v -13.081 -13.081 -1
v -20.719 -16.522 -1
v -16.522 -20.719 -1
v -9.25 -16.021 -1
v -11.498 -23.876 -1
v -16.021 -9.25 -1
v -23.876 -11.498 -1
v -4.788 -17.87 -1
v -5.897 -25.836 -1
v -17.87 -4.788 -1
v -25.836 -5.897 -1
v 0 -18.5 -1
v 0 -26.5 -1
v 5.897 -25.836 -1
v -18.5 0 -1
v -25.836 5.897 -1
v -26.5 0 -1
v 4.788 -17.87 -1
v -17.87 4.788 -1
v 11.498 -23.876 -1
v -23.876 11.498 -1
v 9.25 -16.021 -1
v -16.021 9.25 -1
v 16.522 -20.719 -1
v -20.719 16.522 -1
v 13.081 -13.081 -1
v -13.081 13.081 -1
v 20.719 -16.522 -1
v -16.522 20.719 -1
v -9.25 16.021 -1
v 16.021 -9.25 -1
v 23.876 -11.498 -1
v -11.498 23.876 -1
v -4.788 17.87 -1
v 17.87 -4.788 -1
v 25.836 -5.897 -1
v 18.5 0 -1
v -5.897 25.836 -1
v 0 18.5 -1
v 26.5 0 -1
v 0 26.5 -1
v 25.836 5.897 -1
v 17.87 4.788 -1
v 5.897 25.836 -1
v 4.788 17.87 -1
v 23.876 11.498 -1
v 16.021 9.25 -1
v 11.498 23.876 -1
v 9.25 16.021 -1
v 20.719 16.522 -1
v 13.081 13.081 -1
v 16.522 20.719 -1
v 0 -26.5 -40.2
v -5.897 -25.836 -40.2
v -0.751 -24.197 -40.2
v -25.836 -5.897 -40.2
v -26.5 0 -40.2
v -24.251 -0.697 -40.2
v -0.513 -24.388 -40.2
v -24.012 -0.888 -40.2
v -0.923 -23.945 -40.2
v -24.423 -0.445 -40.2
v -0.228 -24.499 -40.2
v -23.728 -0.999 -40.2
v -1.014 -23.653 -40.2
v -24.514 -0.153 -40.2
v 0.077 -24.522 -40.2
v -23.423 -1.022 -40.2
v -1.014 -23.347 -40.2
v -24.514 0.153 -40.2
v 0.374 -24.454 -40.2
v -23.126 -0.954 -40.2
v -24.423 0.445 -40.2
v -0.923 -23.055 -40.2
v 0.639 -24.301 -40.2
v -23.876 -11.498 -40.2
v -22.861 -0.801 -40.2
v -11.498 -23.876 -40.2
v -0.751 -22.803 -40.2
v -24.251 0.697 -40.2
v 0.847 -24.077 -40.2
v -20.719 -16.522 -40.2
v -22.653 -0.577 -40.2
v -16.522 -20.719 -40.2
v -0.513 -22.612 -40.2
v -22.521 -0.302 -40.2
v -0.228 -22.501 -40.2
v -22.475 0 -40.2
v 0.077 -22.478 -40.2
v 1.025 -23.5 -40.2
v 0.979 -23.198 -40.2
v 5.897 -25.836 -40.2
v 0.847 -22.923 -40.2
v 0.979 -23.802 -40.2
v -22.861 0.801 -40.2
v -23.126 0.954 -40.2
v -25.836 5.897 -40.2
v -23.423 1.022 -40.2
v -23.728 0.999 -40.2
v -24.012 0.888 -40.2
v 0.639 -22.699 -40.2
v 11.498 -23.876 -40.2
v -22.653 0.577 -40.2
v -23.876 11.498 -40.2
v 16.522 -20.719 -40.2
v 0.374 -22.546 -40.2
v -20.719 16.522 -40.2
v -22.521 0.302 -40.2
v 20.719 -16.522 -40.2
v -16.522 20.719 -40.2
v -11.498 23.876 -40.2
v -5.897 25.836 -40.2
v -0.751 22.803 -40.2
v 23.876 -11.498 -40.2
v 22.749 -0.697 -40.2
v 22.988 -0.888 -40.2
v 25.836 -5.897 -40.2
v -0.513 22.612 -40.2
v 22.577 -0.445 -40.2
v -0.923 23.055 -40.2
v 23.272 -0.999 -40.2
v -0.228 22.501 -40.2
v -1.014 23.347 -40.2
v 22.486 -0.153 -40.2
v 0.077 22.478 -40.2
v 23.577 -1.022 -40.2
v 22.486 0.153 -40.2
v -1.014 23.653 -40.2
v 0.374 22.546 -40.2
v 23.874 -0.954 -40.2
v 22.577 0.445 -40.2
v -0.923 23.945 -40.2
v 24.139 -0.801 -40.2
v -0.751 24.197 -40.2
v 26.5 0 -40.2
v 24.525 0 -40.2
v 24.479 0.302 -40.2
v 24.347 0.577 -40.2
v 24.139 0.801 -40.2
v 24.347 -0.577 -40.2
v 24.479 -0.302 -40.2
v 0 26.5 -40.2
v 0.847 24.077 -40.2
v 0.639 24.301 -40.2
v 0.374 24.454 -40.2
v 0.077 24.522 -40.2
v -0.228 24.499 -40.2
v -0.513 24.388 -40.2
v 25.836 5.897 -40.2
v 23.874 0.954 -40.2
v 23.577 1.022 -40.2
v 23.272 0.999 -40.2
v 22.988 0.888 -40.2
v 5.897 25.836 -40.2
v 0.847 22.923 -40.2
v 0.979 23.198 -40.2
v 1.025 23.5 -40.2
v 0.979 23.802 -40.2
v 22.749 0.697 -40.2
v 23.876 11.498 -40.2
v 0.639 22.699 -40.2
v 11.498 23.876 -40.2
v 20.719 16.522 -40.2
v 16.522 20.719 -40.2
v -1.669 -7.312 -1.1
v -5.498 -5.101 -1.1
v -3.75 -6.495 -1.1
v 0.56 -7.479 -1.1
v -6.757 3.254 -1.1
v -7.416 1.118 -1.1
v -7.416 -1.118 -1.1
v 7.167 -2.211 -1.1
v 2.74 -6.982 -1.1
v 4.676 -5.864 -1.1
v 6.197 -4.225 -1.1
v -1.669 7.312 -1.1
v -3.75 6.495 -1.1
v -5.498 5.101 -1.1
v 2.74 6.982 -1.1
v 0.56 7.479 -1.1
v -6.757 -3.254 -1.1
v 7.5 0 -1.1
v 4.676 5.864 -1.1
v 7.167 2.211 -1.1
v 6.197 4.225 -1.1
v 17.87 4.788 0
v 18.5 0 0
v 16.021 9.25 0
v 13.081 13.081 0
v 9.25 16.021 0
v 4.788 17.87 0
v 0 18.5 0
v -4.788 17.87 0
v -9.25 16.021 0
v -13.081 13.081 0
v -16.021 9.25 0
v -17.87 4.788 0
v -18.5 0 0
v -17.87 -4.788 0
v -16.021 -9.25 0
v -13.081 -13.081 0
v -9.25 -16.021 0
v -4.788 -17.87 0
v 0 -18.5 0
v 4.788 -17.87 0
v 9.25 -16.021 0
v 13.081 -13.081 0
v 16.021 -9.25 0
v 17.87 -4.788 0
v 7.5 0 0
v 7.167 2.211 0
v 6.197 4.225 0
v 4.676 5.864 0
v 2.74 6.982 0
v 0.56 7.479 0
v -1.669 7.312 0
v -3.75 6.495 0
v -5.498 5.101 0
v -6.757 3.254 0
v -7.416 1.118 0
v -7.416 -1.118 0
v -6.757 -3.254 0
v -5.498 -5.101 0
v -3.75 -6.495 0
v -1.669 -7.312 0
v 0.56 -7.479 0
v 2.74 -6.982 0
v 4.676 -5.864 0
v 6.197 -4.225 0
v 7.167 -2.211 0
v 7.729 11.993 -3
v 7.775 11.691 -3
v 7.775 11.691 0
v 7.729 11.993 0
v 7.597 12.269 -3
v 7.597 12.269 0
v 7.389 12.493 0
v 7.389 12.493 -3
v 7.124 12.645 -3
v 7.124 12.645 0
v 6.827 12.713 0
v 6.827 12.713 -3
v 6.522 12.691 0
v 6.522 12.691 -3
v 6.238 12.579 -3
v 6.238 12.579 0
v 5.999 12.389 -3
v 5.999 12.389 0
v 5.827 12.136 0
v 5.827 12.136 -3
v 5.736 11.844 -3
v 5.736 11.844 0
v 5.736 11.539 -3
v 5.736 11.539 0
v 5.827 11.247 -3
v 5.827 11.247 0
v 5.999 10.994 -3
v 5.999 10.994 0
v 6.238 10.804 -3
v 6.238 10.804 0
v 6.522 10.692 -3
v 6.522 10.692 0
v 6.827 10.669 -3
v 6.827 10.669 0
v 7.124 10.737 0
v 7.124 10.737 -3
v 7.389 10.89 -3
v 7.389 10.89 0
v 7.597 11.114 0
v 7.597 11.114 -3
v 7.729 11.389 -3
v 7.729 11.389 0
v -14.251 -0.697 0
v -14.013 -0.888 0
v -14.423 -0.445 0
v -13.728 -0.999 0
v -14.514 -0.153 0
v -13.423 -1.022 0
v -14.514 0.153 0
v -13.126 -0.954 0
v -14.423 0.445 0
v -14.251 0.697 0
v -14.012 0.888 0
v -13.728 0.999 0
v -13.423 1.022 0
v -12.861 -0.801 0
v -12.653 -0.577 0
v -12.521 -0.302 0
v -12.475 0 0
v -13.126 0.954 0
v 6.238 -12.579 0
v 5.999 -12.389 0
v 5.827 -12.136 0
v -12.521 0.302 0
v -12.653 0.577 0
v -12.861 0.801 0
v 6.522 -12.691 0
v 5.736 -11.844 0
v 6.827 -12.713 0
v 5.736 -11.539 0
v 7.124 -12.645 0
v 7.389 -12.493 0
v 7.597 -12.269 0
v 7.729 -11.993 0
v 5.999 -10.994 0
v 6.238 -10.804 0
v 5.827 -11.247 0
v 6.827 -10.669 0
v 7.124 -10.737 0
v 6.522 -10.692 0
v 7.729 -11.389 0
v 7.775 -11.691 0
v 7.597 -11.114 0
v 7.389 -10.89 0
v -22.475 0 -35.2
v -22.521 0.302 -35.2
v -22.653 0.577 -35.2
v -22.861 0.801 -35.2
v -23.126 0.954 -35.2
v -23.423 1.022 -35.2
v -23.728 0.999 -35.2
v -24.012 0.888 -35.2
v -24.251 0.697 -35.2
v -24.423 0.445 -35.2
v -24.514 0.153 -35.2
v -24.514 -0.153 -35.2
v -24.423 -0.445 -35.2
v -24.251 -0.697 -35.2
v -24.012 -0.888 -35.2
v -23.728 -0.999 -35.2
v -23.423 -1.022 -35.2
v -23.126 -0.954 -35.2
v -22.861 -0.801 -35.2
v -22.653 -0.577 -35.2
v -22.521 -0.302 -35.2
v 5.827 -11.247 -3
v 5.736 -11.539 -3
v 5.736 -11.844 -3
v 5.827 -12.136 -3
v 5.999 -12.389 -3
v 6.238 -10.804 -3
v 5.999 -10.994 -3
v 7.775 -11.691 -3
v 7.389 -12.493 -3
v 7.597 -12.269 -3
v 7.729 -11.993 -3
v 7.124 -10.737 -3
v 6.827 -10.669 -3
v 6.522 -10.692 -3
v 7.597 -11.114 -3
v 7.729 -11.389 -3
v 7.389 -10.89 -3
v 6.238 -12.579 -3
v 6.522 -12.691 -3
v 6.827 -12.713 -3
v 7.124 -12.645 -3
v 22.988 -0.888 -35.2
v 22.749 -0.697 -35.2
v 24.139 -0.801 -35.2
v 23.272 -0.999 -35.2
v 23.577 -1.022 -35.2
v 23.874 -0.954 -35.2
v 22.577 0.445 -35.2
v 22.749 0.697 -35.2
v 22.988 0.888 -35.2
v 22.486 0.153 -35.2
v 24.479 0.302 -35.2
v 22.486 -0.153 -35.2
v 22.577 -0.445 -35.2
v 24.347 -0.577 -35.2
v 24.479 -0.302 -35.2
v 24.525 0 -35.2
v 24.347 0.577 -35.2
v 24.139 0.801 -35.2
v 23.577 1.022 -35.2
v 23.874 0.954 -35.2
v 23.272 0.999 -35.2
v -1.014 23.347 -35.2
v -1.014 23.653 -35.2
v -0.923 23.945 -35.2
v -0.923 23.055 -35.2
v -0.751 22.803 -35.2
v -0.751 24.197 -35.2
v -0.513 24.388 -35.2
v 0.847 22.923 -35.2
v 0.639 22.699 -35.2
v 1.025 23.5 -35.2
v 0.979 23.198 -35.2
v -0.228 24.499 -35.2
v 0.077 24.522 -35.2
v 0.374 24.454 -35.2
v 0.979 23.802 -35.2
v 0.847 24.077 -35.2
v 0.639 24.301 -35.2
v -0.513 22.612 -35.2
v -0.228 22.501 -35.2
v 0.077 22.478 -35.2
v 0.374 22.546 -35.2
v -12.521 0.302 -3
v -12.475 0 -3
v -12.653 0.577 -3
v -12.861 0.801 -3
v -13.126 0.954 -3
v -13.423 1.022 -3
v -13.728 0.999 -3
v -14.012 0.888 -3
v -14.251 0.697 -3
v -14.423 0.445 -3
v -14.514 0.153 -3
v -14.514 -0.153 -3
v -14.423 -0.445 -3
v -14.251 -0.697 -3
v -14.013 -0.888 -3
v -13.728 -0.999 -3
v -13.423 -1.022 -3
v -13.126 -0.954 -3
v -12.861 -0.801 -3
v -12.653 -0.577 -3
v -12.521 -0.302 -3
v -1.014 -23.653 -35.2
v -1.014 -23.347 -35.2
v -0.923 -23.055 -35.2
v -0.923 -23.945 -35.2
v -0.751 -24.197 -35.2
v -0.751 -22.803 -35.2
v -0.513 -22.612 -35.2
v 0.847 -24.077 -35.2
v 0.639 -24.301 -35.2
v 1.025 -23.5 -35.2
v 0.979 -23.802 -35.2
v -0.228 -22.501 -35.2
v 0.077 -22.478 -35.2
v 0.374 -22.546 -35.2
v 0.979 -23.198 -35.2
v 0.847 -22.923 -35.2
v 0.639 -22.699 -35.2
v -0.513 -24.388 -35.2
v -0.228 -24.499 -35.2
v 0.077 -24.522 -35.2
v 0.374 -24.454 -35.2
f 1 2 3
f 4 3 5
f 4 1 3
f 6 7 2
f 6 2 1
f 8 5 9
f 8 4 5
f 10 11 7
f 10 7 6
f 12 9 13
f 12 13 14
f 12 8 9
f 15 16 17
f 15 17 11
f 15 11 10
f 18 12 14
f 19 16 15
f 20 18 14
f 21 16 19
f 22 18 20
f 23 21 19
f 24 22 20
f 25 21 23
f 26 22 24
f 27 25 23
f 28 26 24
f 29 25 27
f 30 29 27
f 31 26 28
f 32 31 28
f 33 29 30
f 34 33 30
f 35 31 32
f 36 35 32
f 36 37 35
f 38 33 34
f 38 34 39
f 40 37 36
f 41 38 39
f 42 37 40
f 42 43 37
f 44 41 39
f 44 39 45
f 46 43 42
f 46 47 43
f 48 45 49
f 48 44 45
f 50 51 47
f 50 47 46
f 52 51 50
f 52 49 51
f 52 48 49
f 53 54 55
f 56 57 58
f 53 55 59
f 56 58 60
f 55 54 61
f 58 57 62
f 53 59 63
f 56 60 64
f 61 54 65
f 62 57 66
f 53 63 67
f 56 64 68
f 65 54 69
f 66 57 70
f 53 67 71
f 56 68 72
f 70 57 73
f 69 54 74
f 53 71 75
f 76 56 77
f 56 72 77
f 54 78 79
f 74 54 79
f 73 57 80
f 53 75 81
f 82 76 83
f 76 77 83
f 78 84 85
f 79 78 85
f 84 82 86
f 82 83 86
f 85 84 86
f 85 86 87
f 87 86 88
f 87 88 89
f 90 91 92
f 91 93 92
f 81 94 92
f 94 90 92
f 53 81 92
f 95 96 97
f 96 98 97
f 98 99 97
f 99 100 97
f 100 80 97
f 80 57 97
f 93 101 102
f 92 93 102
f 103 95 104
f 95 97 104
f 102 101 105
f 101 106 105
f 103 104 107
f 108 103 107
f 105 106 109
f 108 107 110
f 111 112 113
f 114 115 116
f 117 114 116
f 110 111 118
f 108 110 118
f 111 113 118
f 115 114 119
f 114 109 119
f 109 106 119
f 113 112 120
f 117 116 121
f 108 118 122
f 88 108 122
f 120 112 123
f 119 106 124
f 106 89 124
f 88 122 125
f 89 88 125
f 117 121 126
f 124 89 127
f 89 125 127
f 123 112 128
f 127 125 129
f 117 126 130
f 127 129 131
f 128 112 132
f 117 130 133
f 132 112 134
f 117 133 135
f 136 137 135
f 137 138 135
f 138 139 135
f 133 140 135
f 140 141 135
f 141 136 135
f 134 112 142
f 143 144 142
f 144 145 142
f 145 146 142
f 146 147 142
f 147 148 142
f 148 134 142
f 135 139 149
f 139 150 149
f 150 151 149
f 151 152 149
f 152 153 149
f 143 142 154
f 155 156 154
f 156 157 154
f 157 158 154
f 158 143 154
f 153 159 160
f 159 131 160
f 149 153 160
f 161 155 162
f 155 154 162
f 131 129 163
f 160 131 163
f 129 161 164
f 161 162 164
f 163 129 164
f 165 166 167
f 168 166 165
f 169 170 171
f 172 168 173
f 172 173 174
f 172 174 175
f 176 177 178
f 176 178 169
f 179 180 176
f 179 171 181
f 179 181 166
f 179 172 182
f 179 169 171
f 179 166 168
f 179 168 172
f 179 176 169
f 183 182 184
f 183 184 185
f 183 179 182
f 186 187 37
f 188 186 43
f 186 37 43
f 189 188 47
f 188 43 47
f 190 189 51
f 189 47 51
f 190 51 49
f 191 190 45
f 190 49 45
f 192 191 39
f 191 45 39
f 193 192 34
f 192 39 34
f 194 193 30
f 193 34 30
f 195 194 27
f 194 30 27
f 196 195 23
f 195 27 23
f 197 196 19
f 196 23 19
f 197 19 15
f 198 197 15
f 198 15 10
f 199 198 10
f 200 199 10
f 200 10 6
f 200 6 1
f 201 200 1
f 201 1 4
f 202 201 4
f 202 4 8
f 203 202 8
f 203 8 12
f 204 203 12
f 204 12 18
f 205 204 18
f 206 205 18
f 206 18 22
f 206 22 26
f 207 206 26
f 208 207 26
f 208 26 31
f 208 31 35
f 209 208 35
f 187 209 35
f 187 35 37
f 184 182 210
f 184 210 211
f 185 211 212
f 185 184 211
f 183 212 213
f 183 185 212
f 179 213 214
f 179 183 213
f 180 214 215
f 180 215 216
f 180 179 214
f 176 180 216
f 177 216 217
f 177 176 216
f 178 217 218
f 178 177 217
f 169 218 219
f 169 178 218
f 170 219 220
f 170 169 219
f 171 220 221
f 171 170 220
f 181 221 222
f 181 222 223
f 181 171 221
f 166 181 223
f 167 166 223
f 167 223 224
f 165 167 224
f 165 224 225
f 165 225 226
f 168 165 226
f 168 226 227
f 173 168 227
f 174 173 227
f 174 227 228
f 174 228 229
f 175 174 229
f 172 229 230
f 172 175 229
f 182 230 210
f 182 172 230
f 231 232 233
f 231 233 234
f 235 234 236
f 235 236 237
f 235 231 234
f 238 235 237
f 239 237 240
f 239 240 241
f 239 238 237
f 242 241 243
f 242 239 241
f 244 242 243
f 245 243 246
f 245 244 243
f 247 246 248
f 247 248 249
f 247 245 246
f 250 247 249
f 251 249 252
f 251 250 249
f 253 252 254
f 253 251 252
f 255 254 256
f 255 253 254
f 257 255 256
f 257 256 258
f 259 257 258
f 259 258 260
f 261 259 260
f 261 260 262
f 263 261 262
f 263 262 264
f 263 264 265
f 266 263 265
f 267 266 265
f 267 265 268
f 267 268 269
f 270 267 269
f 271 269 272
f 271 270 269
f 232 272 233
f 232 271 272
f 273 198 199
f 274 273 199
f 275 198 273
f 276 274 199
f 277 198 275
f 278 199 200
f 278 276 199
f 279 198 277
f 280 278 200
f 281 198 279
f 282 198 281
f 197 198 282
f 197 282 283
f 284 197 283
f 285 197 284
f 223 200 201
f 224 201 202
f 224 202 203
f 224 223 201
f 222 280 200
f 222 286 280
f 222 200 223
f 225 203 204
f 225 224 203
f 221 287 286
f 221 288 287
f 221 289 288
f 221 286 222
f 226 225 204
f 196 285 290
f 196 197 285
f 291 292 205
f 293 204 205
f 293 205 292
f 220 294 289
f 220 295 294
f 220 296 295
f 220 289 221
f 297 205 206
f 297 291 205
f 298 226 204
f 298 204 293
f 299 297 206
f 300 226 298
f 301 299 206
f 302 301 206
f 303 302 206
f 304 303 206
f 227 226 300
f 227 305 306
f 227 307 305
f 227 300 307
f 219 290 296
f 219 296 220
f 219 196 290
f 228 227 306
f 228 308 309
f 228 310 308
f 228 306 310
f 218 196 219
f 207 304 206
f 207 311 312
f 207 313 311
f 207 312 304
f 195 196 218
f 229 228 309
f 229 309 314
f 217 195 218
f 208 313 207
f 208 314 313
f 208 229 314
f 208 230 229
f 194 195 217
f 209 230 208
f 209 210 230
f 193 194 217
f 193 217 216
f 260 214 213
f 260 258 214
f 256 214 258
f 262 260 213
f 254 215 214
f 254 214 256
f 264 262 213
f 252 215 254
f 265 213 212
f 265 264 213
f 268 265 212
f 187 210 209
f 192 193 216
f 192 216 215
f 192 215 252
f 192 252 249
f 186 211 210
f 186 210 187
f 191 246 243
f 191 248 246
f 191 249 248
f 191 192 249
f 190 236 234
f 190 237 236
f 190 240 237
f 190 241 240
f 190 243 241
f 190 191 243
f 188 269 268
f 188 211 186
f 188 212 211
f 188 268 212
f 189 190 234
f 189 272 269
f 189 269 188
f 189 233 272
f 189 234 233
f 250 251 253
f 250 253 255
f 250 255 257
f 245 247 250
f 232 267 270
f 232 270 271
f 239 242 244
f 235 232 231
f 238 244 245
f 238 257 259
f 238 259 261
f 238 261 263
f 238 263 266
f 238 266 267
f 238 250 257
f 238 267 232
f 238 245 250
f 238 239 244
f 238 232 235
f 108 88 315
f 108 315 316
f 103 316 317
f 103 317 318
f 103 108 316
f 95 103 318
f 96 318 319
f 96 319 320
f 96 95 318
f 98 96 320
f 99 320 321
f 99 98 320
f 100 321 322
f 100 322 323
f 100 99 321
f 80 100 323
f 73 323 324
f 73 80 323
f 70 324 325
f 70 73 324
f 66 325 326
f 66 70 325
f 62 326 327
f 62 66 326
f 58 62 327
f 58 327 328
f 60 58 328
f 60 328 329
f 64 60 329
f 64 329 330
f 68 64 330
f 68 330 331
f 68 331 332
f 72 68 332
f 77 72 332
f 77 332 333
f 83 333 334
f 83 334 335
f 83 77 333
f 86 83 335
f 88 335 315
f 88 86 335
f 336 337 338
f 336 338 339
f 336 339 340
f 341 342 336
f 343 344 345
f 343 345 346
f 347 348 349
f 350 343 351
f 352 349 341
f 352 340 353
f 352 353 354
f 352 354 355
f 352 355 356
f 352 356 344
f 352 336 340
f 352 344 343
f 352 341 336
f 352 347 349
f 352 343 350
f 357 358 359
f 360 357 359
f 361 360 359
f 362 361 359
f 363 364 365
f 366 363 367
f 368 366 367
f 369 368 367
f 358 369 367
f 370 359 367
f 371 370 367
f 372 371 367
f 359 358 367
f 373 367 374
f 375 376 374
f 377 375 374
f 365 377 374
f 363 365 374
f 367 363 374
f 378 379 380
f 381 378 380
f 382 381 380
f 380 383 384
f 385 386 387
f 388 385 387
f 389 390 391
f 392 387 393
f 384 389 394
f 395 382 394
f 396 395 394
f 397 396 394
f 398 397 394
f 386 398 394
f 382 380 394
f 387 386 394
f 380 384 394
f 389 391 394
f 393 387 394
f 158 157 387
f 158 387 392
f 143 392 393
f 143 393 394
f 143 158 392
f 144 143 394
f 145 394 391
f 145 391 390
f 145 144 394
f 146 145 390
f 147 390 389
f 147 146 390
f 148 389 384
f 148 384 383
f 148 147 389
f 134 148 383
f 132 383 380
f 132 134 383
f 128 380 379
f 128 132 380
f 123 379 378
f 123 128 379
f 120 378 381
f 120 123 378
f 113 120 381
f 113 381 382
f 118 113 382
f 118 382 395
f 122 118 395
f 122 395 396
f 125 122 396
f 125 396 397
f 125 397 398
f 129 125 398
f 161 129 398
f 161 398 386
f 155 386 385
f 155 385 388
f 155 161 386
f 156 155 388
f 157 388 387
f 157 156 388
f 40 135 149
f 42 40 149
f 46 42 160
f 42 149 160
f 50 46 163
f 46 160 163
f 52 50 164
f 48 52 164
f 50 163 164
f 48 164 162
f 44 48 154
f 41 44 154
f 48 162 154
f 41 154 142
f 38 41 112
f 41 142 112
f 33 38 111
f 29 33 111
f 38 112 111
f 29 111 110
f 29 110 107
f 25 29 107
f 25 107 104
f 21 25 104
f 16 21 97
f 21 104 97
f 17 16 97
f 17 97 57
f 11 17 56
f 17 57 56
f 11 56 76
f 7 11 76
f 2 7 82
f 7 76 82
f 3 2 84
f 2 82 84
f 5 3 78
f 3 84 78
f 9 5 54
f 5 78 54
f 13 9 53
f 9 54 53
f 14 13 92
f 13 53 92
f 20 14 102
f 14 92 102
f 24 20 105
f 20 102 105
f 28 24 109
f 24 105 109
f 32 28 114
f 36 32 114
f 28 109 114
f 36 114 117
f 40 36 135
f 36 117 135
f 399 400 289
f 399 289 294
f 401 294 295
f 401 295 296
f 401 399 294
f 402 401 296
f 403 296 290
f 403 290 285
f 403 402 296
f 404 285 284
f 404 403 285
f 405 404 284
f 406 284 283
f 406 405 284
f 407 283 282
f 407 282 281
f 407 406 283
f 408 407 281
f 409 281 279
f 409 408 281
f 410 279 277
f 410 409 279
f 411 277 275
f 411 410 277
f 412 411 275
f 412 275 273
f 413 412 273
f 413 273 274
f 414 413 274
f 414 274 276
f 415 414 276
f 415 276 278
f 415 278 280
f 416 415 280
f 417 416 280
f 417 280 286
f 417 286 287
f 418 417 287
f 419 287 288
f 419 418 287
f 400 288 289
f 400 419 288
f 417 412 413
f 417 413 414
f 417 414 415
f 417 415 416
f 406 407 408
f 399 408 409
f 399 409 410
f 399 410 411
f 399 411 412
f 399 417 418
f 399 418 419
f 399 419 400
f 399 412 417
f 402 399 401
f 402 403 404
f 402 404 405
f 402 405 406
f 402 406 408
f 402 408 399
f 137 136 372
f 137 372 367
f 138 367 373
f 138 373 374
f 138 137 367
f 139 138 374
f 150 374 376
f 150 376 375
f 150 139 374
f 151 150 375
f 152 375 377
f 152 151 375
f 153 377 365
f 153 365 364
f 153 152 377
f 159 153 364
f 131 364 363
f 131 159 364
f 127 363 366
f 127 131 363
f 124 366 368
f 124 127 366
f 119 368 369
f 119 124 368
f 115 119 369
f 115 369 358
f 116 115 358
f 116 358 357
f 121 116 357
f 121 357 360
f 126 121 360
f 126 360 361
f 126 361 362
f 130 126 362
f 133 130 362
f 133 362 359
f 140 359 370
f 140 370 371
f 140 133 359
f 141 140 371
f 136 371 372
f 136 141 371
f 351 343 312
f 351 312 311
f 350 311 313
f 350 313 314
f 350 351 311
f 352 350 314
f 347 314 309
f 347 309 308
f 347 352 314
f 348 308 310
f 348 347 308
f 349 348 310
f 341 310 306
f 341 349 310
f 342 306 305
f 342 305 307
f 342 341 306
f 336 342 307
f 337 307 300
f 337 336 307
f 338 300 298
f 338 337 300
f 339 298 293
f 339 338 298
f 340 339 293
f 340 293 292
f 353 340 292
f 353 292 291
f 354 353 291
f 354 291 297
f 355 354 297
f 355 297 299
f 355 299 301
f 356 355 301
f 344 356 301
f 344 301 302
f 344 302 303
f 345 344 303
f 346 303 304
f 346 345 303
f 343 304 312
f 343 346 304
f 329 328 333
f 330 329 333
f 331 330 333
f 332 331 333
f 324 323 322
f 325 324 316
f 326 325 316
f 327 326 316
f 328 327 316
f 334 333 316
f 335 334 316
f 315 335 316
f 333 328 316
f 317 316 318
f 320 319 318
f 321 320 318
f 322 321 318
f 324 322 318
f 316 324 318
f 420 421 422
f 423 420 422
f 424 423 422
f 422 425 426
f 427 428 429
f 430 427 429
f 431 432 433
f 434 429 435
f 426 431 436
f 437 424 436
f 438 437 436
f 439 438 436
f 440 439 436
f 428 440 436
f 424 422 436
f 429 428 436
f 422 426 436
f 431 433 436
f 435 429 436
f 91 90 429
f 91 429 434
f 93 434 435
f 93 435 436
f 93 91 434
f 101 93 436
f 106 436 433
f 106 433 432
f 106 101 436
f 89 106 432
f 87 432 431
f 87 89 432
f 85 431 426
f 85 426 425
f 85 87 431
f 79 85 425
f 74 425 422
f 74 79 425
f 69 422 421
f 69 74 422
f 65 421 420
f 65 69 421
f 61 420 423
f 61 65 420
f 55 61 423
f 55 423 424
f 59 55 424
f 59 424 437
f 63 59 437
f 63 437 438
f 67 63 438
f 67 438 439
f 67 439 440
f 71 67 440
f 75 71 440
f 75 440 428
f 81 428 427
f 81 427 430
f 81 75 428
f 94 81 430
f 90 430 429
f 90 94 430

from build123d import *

# Parameters (mm, degrees)
F_0000_CYLINDER_SKETCH_R = 26.5
F_0000_CYLINDER_DEPTH    = 39.2
F_0002_CYLINDER_SKETCH_R = 18.5
F_0002_CYLINDER_DEPTH    = 1.5
F_0004_CYLINDER_SKETCH_R = 7.5
F_0004_CYLINDER_DEPTH    = 1.1
F_0006_CYLINDER_SKETCH_R = 1.025
F_0006_CYLINDER_DEPTH    = 3
F_0009_CYLINDER_SKETCH_R = 1.025
F_0009_CYLINDER_DEPTH    = 3
F_0012_CYLINDER_SKETCH_R = 1.025
F_0012_CYLINDER_DEPTH    = 3
F_0015_CYLINDER_SKETCH_R = 1.025
F_0015_CYLINDER_DEPTH    = 5
F_0018_CYLINDER_SKETCH_R = 1.025
F_0018_CYLINDER_DEPTH    = 5
F_0021_CYLINDER_SKETCH_R = 1.025
F_0021_CYLINDER_DEPTH    = 5
F_0024_CYLINDER_SKETCH_R = 1.025
F_0024_CYLINDER_DEPTH    = 5


with BuildPart() as part:
    # 0000_cylinder_Sketch → 0000_cylinder (new body)
    with BuildSketch(Plane.XY):
        Circle(F_0000_CYLINDER_SKETCH_R)
    extrude(amount=F_0000_CYLINDER_DEPTH)


with BuildPart() as part_1:
    # 0000_cylinder_Translate: moved
    add(part.part.moved(Location((0, 0, -40.2))))


with BuildPart() as body_2:
    # 0002_cylinder_Sketch → 0002_cylinder (new body)
    with BuildSketch(Plane.XY):
        Circle(F_0002_CYLINDER_SKETCH_R)
    extrude(amount=F_0002_CYLINDER_DEPTH)


with BuildPart() as body_2_1:
    # 0002_cylinder_Translate: moved
    add(body_2.part.moved(Location((0, 0, -1.5))))


with BuildPart() as part_2:
    add(part_1.part)

    # 0003_add: union body 2
    add(body_2_1.part)


with BuildPart() as body_2_2:
    # 0004_cylinder_Sketch → 0004_cylinder (new body)
    with BuildSketch(Plane.XY):
        Circle(F_0004_CYLINDER_SKETCH_R)
    extrude(amount=F_0004_CYLINDER_DEPTH)


with BuildPart() as body_2_2_1:
    # 0004_cylinder_Translate: moved
    add(body_2_2.part.moved(Location((0, 0, -1.1))))


with BuildPart() as part_3:
    add(part_2.part)

    # 0005_sub: cut body 2 2
    add(body_2_2_1.part, mode=Mode.SUBTRACT)


with BuildPart() as body_2_3:
    # 0006_cylinder_Sketch → 0006_cylinder (new body)
    with BuildSketch(Plane.XY):
        Circle(F_0006_CYLINDER_SKETCH_R)
    extrude(amount=F_0006_CYLINDER_DEPTH)


with BuildPart() as body_2_3_1:
    # 0006_cylinder_Translate: moved
    add(body_2_3.part.moved(Location((6.75, 11.691342951, -3))))


with BuildPart() as part_4:
    add(part_3.part)

    # 0008_sub: cut body 2 3
    add(body_2_3_1.part, mode=Mode.SUBTRACT)


with BuildPart() as body_2_4:
    # 0009_cylinder_Sketch → 0009_cylinder (new body)
    with BuildSketch(Plane.XY):
        Circle(F_0009_CYLINDER_SKETCH_R)
    extrude(amount=F_0009_CYLINDER_DEPTH)


with BuildPart() as body_2_4_1:
    # 0009_cylinder_Translate: moved
    add(body_2_4.part.moved(Location((6.75, -11.691342951, -3))))


with BuildPart() as part_5:
    add(part_4.part)

    # 0011_sub: cut body 2 4
    add(body_2_4_1.part, mode=Mode.SUBTRACT)


with BuildPart() as body_2_5:
    # 0012_cylinder_Sketch → 0012_cylinder (new body)
    with BuildSketch(Plane.XY):
        Circle(F_0012_CYLINDER_SKETCH_R)
    extrude(amount=F_0012_CYLINDER_DEPTH)


with BuildPart() as body_2_5_1:
    # 0012_cylinder_Translate: moved
    add(body_2_5.part.moved(Location((-13.5, 0, -3))))


with BuildPart() as part_6:
    add(part_5.part)

    # 0014_sub: cut body 2 5
    add(body_2_5_1.part, mode=Mode.SUBTRACT)


with BuildPart() as body_2_6:
    # 0015_cylinder_Sketch → 0015_cylinder (new body)
    with BuildSketch(Plane.XY):
        Circle(F_0015_CYLINDER_SKETCH_R)
    extrude(amount=F_0015_CYLINDER_DEPTH)


with BuildPart() as body_2_6_1:
    # 0015_cylinder_Translate: moved
    add(body_2_6.part.moved(Location((0, 23.5, -40.2))))


with BuildPart() as part_7:
    add(part_6.part)

    # 0017_sub: cut body 2 6
    add(body_2_6_1.part, mode=Mode.SUBTRACT)


with BuildPart() as body_2_7:
    # 0018_cylinder_Sketch → 0018_cylinder (new body)
    with BuildSketch(Plane.XY):
        Circle(F_0018_CYLINDER_SKETCH_R)
    extrude(amount=F_0018_CYLINDER_DEPTH)


with BuildPart() as body_2_7_1:
    # 0018_cylinder_Translate: moved
    add(body_2_7.part.moved(Location((23.5, 0, -40.2))))


with BuildPart() as part_8:
    add(part_7.part)

    # 0020_sub: cut body 2 7
    add(body_2_7_1.part, mode=Mode.SUBTRACT)


with BuildPart() as body_2_8:
    # 0021_cylinder_Sketch → 0021_cylinder (new body)
    with BuildSketch(Plane.XY):
        Circle(F_0021_CYLINDER_SKETCH_R)
    extrude(amount=F_0021_CYLINDER_DEPTH)


with BuildPart() as body_2_8_1:
    # 0021_cylinder_Translate: moved
    add(body_2_8.part.moved(Location((0, -23.5, -40.2))))


with BuildPart() as part_9:
    add(part_8.part)

    # 0023_sub: cut body 2 8
    add(body_2_8_1.part, mode=Mode.SUBTRACT)


with BuildPart() as body_2_9:
    # 0024_cylinder_Sketch → 0024_cylinder (new body)
    with BuildSketch(Plane.XY):
        Circle(F_0024_CYLINDER_SKETCH_R)
    extrude(amount=F_0024_CYLINDER_DEPTH)


with BuildPart() as body_2_9_1:
    # 0024_cylinder_Translate: moved
    add(body_2_9.part.moved(Location((-23.5, 0, -40.2))))


with BuildPart() as part_10:
    add(part_9.part)

    # 0026_sub: cut body 2 9
    add(body_2_9_1.part, mode=Mode.SUBTRACT)


solid = part_10.part
